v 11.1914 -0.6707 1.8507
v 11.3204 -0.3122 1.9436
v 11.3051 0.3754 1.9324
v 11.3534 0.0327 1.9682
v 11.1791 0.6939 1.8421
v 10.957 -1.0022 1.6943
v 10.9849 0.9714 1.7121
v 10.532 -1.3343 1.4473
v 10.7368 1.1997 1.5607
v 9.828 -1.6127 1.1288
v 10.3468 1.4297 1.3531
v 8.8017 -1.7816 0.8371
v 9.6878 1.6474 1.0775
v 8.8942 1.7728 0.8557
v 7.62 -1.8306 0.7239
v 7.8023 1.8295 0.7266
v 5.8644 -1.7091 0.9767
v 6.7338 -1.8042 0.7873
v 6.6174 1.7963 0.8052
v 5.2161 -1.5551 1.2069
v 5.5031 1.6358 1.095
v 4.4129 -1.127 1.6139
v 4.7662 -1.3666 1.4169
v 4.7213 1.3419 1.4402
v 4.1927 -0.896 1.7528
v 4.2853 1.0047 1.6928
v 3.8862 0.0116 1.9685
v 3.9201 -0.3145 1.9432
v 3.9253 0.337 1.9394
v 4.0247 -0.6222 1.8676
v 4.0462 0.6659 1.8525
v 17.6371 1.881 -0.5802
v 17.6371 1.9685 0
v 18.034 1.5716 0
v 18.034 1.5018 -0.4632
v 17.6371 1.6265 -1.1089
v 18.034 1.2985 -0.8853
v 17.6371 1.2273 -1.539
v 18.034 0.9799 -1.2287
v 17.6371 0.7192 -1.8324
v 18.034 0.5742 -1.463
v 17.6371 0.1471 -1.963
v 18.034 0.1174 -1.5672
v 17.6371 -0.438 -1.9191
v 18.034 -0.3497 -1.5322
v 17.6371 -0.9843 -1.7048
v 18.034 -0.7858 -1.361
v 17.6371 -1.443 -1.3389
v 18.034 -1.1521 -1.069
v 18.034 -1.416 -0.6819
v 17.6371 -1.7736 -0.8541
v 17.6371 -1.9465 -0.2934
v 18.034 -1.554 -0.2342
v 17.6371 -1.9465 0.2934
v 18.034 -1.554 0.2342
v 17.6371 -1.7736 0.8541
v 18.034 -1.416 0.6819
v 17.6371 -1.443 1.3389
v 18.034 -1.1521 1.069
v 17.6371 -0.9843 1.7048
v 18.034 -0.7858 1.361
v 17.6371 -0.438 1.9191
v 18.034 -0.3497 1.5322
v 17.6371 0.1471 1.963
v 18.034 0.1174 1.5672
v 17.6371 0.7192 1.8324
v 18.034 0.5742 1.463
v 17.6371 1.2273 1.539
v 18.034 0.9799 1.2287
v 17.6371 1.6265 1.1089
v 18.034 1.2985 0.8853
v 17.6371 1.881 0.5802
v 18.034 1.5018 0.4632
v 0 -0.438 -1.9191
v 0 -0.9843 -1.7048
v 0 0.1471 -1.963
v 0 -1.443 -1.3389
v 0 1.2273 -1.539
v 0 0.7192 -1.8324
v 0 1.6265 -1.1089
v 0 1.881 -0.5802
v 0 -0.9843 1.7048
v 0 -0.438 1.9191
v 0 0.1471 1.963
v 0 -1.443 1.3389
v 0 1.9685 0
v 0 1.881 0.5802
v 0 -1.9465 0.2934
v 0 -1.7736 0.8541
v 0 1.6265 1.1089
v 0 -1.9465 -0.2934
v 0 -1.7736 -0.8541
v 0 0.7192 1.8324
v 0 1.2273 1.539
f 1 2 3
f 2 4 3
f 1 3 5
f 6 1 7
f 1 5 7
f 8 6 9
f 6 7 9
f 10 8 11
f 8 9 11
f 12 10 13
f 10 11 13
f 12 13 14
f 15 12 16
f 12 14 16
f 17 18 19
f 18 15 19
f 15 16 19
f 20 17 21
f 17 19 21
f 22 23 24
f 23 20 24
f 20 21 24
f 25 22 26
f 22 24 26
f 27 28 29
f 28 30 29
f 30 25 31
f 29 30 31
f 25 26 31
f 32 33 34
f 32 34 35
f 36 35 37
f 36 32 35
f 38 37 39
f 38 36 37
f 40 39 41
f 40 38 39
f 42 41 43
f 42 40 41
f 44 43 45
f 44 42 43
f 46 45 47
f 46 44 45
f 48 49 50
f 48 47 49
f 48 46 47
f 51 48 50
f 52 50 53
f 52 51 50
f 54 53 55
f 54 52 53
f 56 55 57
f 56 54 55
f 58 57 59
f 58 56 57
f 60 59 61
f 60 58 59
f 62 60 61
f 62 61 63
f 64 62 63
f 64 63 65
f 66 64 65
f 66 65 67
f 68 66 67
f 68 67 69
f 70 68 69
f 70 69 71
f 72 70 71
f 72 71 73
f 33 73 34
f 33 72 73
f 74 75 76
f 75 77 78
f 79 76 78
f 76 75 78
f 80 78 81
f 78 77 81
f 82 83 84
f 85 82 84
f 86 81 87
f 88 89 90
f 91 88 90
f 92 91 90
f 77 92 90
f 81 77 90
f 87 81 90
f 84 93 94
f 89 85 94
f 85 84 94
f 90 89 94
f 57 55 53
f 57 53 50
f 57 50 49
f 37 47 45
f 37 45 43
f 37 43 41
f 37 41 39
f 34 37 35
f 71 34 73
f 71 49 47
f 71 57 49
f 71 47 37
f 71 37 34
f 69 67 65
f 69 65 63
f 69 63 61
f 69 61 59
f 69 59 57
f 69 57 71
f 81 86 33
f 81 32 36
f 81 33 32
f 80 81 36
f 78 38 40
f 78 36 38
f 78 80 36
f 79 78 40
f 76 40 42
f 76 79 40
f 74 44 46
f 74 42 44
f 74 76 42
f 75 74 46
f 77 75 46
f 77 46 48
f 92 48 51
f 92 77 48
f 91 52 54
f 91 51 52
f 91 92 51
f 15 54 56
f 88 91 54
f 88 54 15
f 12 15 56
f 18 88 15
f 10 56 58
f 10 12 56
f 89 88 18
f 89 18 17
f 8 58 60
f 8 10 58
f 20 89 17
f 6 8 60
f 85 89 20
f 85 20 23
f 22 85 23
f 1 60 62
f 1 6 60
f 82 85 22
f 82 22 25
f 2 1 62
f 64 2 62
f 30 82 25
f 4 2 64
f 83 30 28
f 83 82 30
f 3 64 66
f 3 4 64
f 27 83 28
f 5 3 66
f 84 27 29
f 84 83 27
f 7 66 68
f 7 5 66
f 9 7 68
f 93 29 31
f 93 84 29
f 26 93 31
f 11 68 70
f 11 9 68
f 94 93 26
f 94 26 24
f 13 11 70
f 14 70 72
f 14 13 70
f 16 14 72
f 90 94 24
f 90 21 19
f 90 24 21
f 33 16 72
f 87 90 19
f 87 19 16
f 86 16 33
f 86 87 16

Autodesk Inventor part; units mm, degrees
ref_plane "YZ Plane" through (0, 0, 0) normal (1, 0, 0) x (0, 1, 0)
ref_plane "XZ Plane" through (0, 0, 0) normal (0, 1, 0) x (-1, 0, 0)
ref_plane "XY Plane" through (0, 0, 0) normal (0, 0, 1) x (1, 0, 0)
sketch "Sketch1" plane through (0, 0, 0) normal (1, 0, 0) x (0, 1, 0)
  circle A0 centre (0, 0) radius 1.9685
  dimension "d0" = 3.937
extrude "Extrusion1" add sketch "Sketch1" along normal blind 18.034
thread "Thread1" size "8-32 UNC" class "2A" standard "ANSI Unified Screw Threads" length 5.08
sketch "Sketch2" plane through (0, 0, 0) normal (0, 1, 0) x (-1, 0, 0)
  line L0 (-18.034, 1.9685) -> (0, 1.9685) projected
  line L1 (0, 1.9685) -> (0, -1.9685) projected
  line L2 (0, -1.9685) -> (-18.034, -1.9685) projected
  line L3 (-18.034, -1.9685) -> (-18.034, 1.9685) projected
  circle A0 centre (-7.62, 6.9469) radius 6.223
  point P0 (0, 0)
  dimension "d6" = 7.62
  dimension "d7" = 4.9784
  dimension "d8" = 12.446
extrude "Extrusion2" cut sketch "Sketch2" along normal through all both and the other way through all contours A0 L0 | L0 A0
chamfer "Chamfer1" distance 0.3969 angle 45 1 edges at (18.034, -1.9685, 0)
properties part number "Screw Lock"
